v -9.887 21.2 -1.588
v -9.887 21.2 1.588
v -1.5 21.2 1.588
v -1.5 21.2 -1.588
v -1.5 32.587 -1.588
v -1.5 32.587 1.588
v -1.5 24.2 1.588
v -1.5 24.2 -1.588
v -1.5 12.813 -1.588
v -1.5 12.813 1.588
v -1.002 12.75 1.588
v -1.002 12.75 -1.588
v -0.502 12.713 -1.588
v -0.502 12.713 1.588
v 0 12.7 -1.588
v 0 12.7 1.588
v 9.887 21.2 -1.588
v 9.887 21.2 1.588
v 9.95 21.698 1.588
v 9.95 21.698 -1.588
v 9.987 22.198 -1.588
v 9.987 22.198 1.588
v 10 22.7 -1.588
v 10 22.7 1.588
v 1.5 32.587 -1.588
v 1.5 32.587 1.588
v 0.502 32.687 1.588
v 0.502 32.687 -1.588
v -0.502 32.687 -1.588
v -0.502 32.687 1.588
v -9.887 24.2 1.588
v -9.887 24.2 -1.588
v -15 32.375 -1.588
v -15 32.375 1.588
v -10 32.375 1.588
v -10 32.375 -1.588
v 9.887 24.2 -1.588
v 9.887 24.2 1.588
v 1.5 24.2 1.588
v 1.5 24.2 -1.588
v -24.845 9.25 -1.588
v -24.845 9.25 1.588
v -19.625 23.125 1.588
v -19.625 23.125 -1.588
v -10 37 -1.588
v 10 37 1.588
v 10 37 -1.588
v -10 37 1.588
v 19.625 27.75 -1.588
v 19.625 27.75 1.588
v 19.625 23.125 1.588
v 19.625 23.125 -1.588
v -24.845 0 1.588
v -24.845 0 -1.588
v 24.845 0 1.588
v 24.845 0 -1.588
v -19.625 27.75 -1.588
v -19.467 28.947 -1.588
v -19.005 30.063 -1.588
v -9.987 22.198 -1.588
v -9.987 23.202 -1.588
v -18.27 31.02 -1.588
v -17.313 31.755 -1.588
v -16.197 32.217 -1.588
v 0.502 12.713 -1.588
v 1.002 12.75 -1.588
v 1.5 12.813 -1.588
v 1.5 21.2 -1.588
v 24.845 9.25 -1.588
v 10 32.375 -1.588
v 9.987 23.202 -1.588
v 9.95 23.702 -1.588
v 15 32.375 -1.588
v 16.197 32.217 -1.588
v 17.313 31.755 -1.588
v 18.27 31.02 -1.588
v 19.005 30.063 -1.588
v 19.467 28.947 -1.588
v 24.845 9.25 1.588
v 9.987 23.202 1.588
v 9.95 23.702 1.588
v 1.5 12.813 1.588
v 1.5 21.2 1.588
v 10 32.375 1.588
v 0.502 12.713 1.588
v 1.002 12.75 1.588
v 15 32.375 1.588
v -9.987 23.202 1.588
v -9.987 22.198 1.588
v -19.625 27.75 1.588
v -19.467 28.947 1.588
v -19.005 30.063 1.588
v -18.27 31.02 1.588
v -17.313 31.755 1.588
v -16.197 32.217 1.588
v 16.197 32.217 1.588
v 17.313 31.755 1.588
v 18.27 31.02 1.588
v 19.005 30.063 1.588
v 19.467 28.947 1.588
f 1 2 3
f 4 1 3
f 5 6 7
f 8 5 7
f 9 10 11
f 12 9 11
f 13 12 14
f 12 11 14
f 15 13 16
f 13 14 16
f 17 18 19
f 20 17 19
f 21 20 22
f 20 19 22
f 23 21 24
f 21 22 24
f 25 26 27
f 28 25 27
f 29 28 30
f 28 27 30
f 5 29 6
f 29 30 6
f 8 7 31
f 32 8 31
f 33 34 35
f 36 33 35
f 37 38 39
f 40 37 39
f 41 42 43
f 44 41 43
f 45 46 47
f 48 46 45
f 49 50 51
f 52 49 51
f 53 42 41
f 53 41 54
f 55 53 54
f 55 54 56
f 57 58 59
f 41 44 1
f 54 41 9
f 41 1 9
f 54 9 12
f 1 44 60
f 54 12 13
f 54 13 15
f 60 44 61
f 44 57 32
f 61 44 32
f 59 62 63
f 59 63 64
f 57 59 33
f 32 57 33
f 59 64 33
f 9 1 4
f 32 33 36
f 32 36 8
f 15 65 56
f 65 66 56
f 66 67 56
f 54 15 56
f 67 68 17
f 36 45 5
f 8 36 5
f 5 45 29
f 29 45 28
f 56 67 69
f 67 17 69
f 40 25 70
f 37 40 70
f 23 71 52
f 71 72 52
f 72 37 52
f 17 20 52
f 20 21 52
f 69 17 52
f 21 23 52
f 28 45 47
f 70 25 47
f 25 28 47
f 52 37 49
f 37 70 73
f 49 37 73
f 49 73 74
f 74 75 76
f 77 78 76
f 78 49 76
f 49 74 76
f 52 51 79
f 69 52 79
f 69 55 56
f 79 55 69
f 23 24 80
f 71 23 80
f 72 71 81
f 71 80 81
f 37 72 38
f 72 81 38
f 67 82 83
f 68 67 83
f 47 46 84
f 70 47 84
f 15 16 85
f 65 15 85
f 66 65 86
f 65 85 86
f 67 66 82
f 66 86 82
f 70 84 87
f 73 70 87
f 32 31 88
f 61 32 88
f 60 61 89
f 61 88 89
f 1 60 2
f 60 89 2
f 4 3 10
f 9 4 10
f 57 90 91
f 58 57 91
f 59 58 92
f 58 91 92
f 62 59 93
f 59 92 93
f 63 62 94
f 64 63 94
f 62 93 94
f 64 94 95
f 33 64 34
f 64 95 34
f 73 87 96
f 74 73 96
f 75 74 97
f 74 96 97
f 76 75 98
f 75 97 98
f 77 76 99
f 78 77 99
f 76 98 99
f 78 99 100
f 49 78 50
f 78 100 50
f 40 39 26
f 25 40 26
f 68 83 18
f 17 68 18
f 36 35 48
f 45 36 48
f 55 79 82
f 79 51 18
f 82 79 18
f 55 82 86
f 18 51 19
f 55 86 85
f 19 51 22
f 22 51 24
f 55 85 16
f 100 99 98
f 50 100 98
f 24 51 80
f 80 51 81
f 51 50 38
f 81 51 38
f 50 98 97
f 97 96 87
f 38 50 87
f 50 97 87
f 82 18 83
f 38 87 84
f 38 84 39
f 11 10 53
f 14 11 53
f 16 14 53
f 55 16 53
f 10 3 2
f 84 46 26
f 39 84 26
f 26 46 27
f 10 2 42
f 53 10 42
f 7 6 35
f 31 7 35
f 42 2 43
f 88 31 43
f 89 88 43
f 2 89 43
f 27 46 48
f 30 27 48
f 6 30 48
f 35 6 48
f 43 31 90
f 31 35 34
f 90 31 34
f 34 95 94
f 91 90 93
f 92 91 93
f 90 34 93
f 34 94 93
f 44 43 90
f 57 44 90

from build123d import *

# Parameters (mm, degrees)
SKETCH1_W           = 39.69
SKETCH1_H           = 3.175
BOSS_EXTRUDE1_DEPTH = 12.7
CUT_EXTRUDE1_DEPTH  = 12.7
SKETCH4_W           = 6.35
SKETCH4_H           = 0.4
CUT_EXTRUDE2_DEPTH  = 12.7
BOSS_EXTRUDE2_DEPTH = 3.175
CUT_EXTRUDE3_DEPTH  = 3.175
BOSS_EXTRUDE3_DEPTH = 3.175
CUT_EXTRUDE4_DEPTH  = 3.175


with BuildPart() as part:
    # Sketch1 → Boss-Extrude1 (new body)
    with BuildSketch(Plane(origin=(0, 0, 0), x_dir=(1, 0, 0), z_dir=(0, 1, 0))):
        Rectangle(SKETCH1_W, SKETCH1_H)
    extrude(amount=BOSS_EXTRUDE1_DEPTH)

    # Sketch3 → Cut-Extrude1 (cut)
    with BuildSketch(Plane.XY.offset(1.5875)):
        with BuildLine():
            ThreePointArc((-10.653064207, 7.9375), (-10.188096222, 9.060032015), (-9.065564207, 9.525))
            Line((-9.065564207, 9.525), (-1.5875, 9.525))
            Line((-1.5875, 9.525), (-1.5875, 12.7))
            Line((-1.5875, 12.7), (-19.845, 12.7))
            Line((-19.845, 12.7), (-19.845, 1.599044979))
            Line((-19.845, 1.599044979), (-10.653064207, 6.35))
            Line((-10.653064207, 6.35), (-10.653064207, 7.9375))
        make_face()
        with BuildLine():
            Line((19.845, 12.7), (1.5875, 12.7))
            Line((1.5875, 12.7), (1.5875, 9.525))
            Line((1.5875, 9.525), (9.065564207, 9.525))
            ThreePointArc((9.065564207, 9.525), (10.188096222, 9.060032015), (10.653064207, 7.9375))
            Line((10.653064207, 7.9375), (10.653064207, 6.35))
            Line((10.653064207, 6.35), (19.845, 3.175))
            Line((19.845, 3.175), (19.845, 12.7))
        make_face()
    extrude(amount=-CUT_EXTRUDE1_DEPTH, mode=Mode.SUBTRACT)

    # Sketch4 → Cut-Extrude2 (cut)
    with BuildSketch(Plane.XY.offset(1.5875)):
        with Locations((0, 6.35)):
            Rectangle(SKETCH4_W, SKETCH4_H)
        Polygon((-0.2, 9.525), (0.2, 9.525), (0.2, 3.175), (0, 3.175), (-0.2, 3.175), align=None)
    extrude(amount=-CUT_EXTRUDE2_DEPTH, mode=Mode.SUBTRACT)

    # Sketch5 → Boss-Extrude2 (add)
    with BuildSketch(Plane.XY.offset(1.5875)):
        with BuildLine():
            Line((1.5875, 9.525), (9.065564207, 9.525))
            ThreePointArc((9.065564207, 9.525), (10.188096222, 9.060032015), (10.653064207, 7.9375))
            Line((10.653064207, 7.9375), (10.653064207, 6.35))
            Line((10.653064207, 6.35), (19.845, 3.175))
            Line((19.845, 3.175), (19.845, 0))
            Line((19.845, 0), (24.845, 0))
            Line((24.845, 0), (24.845, 37))
            Line((24.845, 37), (-24.845, 37))
            Line((-24.845, 37), (-24.845, 0))
            Line((-24.845, 0), (-19.845, 0))
            Line((-19.845, 0), (-19.845, 1.599044979))
            Line((-19.845, 1.599044979), (-10.653064207, 6.35))
            Line((-10.653064207, 6.35), (-10.653064207, 7.9375))
            ThreePointArc((-10.653064207, 7.9375), (-10.188096222, 9.060032015), (-9.065564207, 9.525))
            Line((-9.065564207, 9.525), (-1.5875, 9.525))
            Line((-1.5875, 9.525), (-1.5875, 12.7))
            Line((-1.5875, 12.7), (1.5875, 12.7))
            Line((1.5875, 12.7), (1.5875, 9.525))
        make_face()
    extrude(amount=-BOSS_EXTRUDE2_DEPTH)

    # Sketch6 → Cut-Extrude3 (cut)
    with BuildSketch(Plane.XY.offset(1.5875)):
        with BuildLine():
            Line((-10, 37), (-24.845, 37))
            Line((-24.845, 37), (-24.845, 27.75))
            Line((-24.845, 27.75), (-24.845, 18.5))
            Line((-24.845, 18.5), (-24.845, 9.25))
            Line((-24.845, 9.25), (-19.625, 23.125))
            Line((-19.625, 23.125), (-19.625, 27.75))
            ThreePointArc((-19.625, 27.75), (-18.270368863, 31.020368863), (-15, 32.375))
            Line((-15, 32.375), (-10, 32.375))
            Line((-10, 32.375), (-10, 37))
        make_face()
        with BuildLine():
            Line((24.845, 37), (10, 37))
            Line((10, 37), (10, 32.375))
            Line((10, 32.375), (15, 32.375))
            ThreePointArc((15, 32.375), (18.270368863, 31.020368863), (19.625, 27.75))
            Line((19.625, 27.75), (19.625, 23.125))
            Line((19.625, 23.125), (24.845, 9.25))
            Line((24.845, 9.25), (24.845, 18.5))
            Line((24.845, 18.5), (24.845, 37))
        make_face()
    extrude(amount=-CUT_EXTRUDE3_DEPTH, mode=Mode.SUBTRACT)

    # Sketch7 → Boss-Extrude3 (add)
    with BuildSketch(Plane.XY.offset(1.5875)):
        Polygon((0.2, 6.15), (0.2, 3.175), (-0.2, 3.175), (-0.2, 6.15), (-3.175, 6.15), (-3.175, 6.55), (-0.2, 6.55), (-0.2, 9.525), (0.2, 9.525), (0.2, 6.55), (3.175, 6.55), (3.175, 6.15), align=None)
    extrude(amount=-BOSS_EXTRUDE3_DEPTH)

    # Sketch8 → Cut-Extrude4 (cut)
    with BuildSketch(Plane.XY.offset(1.5875)):
        with BuildLine():
            Line((1.5, 24.2), (1.5, 32.586859967))
            ThreePointArc((1.5, 32.586859967), (0, 32.7), (-1.5, 32.586859967))
            Line((-1.5, 32.586859967), (-1.5, 24.2))
            Line((-1.5, 24.2), (-9.886859967, 24.2))
            ThreePointArc((-9.886859967, 24.2), (-10, 22.7), (-9.886859967, 21.2))
            Line((-9.886859967, 21.2), (-1.5, 21.2))
            Line((-1.5, 21.2), (-1.5, 12.813140033))
            ThreePointArc((-1.5, 12.813140033), (-0.752130419, 12.728325124), (0, 12.7))
            ThreePointArc((0, 12.7), (0.752130419, 12.728325124), (1.5, 12.813140033))
            Line((1.5, 12.813140033), (1.5, 21.2))
            Line((1.5, 21.2), (9.886859967, 21.2))
            ThreePointArc((9.886859967, 21.2), (9.971674876, 21.947869581), (10, 22.7))
            ThreePointArc((10, 22.7), (9.971674876, 23.452130419), (9.886859967, 24.2))
            Line((9.886859967, 24.2), (1.5, 24.2))
        make_face()
    extrude(amount=-CUT_EXTRUDE4_DEPTH, mode=Mode.SUBTRACT)


solid = part.part
